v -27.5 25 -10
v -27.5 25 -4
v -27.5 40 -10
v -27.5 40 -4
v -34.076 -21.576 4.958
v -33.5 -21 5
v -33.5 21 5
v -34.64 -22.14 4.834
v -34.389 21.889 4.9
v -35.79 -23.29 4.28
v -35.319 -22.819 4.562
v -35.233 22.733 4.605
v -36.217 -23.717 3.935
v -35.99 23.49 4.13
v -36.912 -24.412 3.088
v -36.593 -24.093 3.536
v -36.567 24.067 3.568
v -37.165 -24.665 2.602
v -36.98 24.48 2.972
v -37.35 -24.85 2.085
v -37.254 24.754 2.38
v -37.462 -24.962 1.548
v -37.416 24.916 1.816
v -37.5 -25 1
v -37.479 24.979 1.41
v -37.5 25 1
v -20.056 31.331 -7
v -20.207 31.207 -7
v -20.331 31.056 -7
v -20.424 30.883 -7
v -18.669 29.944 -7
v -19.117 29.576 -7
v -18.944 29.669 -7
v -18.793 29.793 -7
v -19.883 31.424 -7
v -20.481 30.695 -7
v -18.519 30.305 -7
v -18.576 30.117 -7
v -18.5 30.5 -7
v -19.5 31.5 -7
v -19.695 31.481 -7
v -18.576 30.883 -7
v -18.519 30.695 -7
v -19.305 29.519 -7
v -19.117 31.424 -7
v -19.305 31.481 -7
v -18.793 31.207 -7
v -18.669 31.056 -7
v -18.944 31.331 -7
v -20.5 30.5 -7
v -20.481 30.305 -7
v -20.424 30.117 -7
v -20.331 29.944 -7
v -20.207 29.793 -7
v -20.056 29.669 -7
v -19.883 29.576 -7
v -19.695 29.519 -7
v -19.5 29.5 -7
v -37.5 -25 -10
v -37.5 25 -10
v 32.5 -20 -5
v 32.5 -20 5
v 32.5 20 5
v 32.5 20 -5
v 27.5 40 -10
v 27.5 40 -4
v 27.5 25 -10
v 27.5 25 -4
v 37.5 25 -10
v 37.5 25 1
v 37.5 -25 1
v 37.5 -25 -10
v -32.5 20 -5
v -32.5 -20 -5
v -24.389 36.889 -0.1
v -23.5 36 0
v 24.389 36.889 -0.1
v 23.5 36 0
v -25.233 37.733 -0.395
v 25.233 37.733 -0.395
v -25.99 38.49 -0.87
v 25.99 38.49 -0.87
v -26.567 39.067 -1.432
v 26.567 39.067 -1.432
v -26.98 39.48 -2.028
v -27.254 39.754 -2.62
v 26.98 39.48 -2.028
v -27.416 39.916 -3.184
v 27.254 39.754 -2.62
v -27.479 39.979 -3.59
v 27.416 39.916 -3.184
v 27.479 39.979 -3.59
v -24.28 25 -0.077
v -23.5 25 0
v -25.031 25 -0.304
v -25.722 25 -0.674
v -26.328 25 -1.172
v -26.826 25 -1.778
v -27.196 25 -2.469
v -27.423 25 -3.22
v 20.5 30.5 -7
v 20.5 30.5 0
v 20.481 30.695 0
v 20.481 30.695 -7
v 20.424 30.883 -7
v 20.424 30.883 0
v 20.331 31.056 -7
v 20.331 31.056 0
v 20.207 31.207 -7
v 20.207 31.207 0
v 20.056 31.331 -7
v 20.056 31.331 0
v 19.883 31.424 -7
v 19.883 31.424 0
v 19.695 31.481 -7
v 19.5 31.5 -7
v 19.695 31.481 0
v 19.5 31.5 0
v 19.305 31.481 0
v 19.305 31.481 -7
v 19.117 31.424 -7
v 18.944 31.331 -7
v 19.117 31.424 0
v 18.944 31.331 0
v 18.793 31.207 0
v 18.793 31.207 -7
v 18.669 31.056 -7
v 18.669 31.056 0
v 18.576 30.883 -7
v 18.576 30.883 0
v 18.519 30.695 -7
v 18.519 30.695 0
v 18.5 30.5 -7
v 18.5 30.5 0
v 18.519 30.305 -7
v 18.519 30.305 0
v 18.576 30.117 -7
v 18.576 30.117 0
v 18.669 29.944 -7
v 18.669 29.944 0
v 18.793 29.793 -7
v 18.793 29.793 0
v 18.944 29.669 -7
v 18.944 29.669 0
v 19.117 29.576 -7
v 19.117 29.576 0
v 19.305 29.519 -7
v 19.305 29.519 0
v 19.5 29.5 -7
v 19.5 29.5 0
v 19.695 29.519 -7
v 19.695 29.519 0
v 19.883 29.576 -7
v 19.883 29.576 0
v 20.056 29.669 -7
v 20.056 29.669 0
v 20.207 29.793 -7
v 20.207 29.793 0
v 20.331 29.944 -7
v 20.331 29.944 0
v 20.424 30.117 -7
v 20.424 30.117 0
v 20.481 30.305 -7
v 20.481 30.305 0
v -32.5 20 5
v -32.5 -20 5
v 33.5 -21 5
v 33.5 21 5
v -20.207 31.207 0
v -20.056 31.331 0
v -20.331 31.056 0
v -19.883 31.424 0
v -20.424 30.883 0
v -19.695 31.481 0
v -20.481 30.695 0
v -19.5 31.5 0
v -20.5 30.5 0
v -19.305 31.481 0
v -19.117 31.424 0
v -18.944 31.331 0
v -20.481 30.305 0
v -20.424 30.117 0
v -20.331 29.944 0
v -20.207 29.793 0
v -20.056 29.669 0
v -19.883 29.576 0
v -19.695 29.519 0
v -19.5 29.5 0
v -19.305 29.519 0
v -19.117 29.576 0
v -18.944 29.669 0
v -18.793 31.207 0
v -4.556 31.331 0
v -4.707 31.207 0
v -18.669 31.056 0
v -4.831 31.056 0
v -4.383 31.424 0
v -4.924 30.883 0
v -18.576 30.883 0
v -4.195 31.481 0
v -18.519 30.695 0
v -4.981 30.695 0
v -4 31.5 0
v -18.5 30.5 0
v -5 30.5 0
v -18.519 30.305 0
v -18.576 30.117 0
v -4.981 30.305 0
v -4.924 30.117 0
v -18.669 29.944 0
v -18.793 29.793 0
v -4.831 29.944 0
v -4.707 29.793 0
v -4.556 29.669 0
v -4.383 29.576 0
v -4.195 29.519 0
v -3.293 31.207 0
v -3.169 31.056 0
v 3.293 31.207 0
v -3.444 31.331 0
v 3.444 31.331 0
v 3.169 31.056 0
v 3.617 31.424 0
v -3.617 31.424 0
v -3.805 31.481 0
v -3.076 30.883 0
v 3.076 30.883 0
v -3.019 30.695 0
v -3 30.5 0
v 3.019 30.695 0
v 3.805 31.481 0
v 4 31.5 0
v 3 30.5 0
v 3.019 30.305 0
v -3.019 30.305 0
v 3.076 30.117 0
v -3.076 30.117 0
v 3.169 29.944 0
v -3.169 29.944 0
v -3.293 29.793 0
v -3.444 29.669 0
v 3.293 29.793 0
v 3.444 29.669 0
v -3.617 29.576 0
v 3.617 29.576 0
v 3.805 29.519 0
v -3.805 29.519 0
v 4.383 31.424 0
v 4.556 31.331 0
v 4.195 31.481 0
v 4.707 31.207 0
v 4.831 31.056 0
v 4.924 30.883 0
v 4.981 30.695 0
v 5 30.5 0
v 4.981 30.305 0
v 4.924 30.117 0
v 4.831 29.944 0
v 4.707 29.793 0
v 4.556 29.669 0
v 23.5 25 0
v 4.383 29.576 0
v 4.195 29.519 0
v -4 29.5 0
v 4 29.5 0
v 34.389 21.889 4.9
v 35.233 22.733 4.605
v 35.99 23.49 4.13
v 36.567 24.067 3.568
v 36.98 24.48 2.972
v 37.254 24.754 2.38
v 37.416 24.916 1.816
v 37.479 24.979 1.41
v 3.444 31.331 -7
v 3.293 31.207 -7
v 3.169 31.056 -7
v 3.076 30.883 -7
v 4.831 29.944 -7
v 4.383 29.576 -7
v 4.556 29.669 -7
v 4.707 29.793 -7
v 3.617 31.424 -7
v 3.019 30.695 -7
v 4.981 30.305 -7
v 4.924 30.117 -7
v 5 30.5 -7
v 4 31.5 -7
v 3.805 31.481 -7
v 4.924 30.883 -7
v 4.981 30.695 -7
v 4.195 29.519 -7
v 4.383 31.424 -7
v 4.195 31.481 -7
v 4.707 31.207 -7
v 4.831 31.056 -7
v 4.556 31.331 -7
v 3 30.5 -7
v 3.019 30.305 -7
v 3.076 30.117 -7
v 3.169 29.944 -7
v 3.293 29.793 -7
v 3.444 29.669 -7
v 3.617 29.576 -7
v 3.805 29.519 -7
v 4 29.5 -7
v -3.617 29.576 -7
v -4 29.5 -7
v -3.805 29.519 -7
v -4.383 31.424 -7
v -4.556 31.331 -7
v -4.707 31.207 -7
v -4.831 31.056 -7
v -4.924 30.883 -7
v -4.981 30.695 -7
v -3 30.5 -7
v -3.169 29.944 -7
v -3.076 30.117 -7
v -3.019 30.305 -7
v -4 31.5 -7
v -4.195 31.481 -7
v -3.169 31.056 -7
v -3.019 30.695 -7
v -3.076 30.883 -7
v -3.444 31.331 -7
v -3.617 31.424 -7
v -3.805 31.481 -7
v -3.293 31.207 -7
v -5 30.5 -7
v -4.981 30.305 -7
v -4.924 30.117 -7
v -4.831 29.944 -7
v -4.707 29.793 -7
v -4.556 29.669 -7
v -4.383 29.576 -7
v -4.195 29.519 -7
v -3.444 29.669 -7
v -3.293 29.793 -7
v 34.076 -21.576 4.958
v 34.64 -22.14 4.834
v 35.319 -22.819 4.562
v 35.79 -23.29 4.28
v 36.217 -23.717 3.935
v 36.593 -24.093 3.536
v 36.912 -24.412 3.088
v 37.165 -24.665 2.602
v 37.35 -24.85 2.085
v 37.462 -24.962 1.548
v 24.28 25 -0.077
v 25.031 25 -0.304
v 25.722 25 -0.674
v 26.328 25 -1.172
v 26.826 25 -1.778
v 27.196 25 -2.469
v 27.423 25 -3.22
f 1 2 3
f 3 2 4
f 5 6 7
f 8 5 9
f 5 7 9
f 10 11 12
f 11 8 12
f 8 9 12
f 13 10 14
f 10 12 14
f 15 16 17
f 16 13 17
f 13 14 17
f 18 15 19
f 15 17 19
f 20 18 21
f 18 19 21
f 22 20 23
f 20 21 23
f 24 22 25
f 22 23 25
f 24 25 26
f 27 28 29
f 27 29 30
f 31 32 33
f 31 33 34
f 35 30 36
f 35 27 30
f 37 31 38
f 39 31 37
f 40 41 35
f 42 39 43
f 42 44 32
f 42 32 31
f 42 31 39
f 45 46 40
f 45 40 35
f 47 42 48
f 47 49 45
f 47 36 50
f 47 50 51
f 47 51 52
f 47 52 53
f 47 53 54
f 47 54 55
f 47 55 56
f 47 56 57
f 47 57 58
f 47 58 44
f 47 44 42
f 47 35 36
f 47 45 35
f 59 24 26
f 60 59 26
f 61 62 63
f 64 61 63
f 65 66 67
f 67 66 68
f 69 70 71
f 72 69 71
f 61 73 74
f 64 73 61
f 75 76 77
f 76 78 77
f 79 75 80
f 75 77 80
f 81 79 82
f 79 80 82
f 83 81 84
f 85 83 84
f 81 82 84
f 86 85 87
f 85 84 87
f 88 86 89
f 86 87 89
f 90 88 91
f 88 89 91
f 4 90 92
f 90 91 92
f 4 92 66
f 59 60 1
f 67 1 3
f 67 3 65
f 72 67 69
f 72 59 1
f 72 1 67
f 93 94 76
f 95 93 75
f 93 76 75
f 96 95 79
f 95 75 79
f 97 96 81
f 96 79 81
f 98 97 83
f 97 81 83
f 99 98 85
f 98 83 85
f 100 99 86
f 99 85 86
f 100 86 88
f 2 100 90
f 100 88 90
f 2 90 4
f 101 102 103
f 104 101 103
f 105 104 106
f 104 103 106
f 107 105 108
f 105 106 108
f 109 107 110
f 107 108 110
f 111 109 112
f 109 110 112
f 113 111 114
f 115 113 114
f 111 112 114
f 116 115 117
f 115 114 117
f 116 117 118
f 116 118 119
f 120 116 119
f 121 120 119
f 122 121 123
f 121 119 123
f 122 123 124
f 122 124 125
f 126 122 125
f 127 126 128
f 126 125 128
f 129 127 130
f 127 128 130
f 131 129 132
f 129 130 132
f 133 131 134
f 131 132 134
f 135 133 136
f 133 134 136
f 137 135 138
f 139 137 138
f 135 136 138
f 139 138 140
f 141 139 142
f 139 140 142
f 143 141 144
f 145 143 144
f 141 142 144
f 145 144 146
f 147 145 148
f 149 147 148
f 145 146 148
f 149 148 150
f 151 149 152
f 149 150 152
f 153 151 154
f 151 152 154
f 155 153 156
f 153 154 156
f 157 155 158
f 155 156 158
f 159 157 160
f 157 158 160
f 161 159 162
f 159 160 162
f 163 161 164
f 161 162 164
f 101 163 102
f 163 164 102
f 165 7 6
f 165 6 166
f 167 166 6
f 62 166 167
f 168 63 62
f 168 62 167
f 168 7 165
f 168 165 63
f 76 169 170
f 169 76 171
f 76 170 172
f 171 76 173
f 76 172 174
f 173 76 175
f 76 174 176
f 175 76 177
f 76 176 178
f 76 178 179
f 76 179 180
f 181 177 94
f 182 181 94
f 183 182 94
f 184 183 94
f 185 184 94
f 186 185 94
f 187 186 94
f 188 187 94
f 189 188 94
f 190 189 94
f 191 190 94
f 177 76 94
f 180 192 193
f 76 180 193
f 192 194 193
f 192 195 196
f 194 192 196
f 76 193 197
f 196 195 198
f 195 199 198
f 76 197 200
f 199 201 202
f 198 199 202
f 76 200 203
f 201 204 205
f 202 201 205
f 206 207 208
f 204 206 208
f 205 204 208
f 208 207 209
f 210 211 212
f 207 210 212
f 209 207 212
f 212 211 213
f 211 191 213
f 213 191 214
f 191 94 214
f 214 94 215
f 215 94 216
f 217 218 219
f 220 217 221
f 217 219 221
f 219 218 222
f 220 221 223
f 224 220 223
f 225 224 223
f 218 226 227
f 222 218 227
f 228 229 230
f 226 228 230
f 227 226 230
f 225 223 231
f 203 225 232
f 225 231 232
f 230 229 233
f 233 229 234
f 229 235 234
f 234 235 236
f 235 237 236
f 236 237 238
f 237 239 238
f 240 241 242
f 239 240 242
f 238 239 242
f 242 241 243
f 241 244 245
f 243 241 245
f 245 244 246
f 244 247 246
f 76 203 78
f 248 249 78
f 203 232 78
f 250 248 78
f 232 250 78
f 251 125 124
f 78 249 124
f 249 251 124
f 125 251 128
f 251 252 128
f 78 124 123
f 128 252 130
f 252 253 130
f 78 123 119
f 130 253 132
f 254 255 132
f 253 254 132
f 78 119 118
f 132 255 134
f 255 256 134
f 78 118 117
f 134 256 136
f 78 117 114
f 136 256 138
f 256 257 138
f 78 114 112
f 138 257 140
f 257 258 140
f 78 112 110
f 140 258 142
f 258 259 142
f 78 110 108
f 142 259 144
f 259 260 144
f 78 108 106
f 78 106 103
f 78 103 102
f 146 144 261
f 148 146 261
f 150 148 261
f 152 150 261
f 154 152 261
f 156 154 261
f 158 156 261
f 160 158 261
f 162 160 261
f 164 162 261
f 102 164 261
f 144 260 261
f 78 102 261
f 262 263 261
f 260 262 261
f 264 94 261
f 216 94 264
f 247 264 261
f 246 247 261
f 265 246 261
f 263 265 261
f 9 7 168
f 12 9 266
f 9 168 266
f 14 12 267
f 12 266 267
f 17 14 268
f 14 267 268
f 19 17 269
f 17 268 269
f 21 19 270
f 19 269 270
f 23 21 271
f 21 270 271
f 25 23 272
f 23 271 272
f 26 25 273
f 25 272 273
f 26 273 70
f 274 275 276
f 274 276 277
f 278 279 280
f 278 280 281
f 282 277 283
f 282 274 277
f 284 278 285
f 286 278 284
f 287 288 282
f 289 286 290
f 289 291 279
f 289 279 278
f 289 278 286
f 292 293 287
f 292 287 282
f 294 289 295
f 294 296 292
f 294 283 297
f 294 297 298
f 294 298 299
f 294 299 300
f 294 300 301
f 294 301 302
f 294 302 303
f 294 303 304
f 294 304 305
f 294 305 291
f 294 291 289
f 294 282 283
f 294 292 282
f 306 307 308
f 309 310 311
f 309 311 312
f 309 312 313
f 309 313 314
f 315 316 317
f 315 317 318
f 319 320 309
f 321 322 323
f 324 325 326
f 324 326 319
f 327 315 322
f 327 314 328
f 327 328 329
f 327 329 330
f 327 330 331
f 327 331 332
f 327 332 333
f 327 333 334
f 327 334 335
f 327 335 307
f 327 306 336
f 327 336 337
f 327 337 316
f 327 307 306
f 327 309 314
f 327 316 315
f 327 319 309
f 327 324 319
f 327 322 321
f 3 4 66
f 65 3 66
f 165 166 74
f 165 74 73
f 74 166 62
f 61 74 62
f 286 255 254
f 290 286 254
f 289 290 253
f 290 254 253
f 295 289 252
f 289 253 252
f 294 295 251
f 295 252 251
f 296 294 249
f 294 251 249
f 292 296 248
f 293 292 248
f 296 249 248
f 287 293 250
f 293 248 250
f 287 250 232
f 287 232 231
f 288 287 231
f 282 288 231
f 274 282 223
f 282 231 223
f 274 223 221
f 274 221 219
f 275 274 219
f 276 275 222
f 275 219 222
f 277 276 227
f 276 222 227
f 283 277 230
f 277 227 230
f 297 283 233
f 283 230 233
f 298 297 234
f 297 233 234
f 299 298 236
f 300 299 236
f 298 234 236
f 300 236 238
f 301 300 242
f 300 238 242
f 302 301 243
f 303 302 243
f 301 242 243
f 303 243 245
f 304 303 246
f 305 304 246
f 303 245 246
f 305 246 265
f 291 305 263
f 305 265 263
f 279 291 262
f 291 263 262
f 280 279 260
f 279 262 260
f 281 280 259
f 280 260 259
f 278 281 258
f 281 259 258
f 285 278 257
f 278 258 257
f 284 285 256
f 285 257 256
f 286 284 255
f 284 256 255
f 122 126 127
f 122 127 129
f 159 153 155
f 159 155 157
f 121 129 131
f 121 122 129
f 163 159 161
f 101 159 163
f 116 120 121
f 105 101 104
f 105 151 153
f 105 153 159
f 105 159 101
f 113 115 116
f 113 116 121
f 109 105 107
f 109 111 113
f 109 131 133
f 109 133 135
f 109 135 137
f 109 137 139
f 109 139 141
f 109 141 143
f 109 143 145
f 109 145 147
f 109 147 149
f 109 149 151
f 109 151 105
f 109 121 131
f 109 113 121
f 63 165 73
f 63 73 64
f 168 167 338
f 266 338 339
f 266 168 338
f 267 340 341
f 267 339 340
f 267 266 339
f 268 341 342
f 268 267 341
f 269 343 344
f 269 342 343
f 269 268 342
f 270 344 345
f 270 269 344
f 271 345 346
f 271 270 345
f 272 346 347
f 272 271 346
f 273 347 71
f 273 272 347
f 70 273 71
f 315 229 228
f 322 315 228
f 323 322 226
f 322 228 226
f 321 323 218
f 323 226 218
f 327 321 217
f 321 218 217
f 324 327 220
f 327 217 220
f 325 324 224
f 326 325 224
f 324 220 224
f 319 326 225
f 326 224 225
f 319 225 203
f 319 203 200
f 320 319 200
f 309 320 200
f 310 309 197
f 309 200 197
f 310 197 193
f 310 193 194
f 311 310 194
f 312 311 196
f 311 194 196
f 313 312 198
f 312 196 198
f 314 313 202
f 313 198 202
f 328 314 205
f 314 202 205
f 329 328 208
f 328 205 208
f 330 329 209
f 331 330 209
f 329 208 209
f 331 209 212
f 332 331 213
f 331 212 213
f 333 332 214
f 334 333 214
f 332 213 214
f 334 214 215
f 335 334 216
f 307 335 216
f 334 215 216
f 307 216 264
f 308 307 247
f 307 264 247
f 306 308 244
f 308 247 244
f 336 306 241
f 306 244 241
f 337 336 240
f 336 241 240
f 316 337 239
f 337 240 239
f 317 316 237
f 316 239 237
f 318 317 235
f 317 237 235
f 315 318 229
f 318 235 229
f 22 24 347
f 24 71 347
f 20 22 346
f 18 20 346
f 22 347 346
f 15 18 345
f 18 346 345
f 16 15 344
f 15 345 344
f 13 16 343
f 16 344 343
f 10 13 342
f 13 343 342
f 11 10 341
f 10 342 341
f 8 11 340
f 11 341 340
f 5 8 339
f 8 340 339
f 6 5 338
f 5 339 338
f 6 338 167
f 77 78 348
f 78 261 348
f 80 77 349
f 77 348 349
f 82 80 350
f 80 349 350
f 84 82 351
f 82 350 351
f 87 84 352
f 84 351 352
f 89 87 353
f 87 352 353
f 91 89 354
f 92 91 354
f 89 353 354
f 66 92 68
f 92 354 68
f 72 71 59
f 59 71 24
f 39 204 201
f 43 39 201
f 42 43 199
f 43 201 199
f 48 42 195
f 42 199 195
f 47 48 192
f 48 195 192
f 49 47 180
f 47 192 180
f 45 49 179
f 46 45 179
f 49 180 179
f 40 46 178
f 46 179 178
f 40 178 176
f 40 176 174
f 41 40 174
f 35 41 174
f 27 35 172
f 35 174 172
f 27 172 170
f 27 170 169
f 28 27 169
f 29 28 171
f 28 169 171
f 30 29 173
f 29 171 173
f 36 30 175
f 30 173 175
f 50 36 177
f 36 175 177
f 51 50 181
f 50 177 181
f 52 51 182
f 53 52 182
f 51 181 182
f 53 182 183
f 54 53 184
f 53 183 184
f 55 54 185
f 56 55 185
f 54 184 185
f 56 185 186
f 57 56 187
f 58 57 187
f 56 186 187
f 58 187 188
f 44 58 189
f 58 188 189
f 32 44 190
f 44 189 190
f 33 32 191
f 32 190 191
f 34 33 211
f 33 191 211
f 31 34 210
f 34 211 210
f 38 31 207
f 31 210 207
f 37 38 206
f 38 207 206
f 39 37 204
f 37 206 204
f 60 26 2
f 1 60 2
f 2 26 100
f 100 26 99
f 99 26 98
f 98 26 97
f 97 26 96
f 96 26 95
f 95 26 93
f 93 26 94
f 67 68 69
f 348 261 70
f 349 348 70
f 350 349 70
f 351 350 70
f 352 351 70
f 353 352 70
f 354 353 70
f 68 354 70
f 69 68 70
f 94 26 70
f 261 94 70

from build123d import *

# Parameters (mm, degrees)
F0_W     = 75
F0_H     = 50
F1_DEPTH = 5
F3_DEPTH = 10
F4_R     = 4
F5_R     = 1
F6_DEPTH = 7
F7_W     = 65
F7_H     = 40
F8_DEPTH = 10


with BuildPart() as f1:
    # F0 (on Top) → F1 (new body)
    with BuildSketch(Plane.XY):
        Rectangle(F0_W, F0_H)
    extrude(amount=F1_DEPTH)

    # F2 (on face) → F3 (join)
    with BuildSketch(Plane(origin=(0, 0, 0), x_dir=(1, 0, 0), z_dir=(0, 0, -1))):
        Polygon((37.5, 25), (-37.5, 25), (-37.5, -25), (-27.5, -25), (-27.5, -40), (27.5, -40), (27.5, -25), (37.5, -25), align=None)
    extrude(amount=F3_DEPTH)

    # F4
    f4_edges = [f1.edges().sort_by_distance(p)[0] for p in [
        (0, -25, 5),
        (37.5, 0, 5),
        (0, 25, 5),
        (-37.5, 0, 5),
        (27.5, 32.5, 0),
        (0, 40, 0),
        (-27.5, 32.5, 0),
    ]]
    fillet(f4_edges, radius=F4_R)

    # F5 (on face) → F6 (cut)
    with BuildSketch(Plane.XY):
        with Locations((-19.5, 30.5)):
            Circle(F5_R)
        with Locations((-4, 30.5)):
            Circle(F5_R)
        with Locations((4, 30.5)):
            Circle(F5_R)
        with Locations((19.5, 30.5)):
            Circle(F5_R)
    extrude(amount=-F6_DEPTH, mode=Mode.SUBTRACT)

    # F7 (on face) → F8 (cut)
    with BuildSketch(Plane.XY.offset(5)):
        Rectangle(F7_W, F7_H)
    extrude(amount=-F8_DEPTH, mode=Mode.SUBTRACT)


solid = f1.part
